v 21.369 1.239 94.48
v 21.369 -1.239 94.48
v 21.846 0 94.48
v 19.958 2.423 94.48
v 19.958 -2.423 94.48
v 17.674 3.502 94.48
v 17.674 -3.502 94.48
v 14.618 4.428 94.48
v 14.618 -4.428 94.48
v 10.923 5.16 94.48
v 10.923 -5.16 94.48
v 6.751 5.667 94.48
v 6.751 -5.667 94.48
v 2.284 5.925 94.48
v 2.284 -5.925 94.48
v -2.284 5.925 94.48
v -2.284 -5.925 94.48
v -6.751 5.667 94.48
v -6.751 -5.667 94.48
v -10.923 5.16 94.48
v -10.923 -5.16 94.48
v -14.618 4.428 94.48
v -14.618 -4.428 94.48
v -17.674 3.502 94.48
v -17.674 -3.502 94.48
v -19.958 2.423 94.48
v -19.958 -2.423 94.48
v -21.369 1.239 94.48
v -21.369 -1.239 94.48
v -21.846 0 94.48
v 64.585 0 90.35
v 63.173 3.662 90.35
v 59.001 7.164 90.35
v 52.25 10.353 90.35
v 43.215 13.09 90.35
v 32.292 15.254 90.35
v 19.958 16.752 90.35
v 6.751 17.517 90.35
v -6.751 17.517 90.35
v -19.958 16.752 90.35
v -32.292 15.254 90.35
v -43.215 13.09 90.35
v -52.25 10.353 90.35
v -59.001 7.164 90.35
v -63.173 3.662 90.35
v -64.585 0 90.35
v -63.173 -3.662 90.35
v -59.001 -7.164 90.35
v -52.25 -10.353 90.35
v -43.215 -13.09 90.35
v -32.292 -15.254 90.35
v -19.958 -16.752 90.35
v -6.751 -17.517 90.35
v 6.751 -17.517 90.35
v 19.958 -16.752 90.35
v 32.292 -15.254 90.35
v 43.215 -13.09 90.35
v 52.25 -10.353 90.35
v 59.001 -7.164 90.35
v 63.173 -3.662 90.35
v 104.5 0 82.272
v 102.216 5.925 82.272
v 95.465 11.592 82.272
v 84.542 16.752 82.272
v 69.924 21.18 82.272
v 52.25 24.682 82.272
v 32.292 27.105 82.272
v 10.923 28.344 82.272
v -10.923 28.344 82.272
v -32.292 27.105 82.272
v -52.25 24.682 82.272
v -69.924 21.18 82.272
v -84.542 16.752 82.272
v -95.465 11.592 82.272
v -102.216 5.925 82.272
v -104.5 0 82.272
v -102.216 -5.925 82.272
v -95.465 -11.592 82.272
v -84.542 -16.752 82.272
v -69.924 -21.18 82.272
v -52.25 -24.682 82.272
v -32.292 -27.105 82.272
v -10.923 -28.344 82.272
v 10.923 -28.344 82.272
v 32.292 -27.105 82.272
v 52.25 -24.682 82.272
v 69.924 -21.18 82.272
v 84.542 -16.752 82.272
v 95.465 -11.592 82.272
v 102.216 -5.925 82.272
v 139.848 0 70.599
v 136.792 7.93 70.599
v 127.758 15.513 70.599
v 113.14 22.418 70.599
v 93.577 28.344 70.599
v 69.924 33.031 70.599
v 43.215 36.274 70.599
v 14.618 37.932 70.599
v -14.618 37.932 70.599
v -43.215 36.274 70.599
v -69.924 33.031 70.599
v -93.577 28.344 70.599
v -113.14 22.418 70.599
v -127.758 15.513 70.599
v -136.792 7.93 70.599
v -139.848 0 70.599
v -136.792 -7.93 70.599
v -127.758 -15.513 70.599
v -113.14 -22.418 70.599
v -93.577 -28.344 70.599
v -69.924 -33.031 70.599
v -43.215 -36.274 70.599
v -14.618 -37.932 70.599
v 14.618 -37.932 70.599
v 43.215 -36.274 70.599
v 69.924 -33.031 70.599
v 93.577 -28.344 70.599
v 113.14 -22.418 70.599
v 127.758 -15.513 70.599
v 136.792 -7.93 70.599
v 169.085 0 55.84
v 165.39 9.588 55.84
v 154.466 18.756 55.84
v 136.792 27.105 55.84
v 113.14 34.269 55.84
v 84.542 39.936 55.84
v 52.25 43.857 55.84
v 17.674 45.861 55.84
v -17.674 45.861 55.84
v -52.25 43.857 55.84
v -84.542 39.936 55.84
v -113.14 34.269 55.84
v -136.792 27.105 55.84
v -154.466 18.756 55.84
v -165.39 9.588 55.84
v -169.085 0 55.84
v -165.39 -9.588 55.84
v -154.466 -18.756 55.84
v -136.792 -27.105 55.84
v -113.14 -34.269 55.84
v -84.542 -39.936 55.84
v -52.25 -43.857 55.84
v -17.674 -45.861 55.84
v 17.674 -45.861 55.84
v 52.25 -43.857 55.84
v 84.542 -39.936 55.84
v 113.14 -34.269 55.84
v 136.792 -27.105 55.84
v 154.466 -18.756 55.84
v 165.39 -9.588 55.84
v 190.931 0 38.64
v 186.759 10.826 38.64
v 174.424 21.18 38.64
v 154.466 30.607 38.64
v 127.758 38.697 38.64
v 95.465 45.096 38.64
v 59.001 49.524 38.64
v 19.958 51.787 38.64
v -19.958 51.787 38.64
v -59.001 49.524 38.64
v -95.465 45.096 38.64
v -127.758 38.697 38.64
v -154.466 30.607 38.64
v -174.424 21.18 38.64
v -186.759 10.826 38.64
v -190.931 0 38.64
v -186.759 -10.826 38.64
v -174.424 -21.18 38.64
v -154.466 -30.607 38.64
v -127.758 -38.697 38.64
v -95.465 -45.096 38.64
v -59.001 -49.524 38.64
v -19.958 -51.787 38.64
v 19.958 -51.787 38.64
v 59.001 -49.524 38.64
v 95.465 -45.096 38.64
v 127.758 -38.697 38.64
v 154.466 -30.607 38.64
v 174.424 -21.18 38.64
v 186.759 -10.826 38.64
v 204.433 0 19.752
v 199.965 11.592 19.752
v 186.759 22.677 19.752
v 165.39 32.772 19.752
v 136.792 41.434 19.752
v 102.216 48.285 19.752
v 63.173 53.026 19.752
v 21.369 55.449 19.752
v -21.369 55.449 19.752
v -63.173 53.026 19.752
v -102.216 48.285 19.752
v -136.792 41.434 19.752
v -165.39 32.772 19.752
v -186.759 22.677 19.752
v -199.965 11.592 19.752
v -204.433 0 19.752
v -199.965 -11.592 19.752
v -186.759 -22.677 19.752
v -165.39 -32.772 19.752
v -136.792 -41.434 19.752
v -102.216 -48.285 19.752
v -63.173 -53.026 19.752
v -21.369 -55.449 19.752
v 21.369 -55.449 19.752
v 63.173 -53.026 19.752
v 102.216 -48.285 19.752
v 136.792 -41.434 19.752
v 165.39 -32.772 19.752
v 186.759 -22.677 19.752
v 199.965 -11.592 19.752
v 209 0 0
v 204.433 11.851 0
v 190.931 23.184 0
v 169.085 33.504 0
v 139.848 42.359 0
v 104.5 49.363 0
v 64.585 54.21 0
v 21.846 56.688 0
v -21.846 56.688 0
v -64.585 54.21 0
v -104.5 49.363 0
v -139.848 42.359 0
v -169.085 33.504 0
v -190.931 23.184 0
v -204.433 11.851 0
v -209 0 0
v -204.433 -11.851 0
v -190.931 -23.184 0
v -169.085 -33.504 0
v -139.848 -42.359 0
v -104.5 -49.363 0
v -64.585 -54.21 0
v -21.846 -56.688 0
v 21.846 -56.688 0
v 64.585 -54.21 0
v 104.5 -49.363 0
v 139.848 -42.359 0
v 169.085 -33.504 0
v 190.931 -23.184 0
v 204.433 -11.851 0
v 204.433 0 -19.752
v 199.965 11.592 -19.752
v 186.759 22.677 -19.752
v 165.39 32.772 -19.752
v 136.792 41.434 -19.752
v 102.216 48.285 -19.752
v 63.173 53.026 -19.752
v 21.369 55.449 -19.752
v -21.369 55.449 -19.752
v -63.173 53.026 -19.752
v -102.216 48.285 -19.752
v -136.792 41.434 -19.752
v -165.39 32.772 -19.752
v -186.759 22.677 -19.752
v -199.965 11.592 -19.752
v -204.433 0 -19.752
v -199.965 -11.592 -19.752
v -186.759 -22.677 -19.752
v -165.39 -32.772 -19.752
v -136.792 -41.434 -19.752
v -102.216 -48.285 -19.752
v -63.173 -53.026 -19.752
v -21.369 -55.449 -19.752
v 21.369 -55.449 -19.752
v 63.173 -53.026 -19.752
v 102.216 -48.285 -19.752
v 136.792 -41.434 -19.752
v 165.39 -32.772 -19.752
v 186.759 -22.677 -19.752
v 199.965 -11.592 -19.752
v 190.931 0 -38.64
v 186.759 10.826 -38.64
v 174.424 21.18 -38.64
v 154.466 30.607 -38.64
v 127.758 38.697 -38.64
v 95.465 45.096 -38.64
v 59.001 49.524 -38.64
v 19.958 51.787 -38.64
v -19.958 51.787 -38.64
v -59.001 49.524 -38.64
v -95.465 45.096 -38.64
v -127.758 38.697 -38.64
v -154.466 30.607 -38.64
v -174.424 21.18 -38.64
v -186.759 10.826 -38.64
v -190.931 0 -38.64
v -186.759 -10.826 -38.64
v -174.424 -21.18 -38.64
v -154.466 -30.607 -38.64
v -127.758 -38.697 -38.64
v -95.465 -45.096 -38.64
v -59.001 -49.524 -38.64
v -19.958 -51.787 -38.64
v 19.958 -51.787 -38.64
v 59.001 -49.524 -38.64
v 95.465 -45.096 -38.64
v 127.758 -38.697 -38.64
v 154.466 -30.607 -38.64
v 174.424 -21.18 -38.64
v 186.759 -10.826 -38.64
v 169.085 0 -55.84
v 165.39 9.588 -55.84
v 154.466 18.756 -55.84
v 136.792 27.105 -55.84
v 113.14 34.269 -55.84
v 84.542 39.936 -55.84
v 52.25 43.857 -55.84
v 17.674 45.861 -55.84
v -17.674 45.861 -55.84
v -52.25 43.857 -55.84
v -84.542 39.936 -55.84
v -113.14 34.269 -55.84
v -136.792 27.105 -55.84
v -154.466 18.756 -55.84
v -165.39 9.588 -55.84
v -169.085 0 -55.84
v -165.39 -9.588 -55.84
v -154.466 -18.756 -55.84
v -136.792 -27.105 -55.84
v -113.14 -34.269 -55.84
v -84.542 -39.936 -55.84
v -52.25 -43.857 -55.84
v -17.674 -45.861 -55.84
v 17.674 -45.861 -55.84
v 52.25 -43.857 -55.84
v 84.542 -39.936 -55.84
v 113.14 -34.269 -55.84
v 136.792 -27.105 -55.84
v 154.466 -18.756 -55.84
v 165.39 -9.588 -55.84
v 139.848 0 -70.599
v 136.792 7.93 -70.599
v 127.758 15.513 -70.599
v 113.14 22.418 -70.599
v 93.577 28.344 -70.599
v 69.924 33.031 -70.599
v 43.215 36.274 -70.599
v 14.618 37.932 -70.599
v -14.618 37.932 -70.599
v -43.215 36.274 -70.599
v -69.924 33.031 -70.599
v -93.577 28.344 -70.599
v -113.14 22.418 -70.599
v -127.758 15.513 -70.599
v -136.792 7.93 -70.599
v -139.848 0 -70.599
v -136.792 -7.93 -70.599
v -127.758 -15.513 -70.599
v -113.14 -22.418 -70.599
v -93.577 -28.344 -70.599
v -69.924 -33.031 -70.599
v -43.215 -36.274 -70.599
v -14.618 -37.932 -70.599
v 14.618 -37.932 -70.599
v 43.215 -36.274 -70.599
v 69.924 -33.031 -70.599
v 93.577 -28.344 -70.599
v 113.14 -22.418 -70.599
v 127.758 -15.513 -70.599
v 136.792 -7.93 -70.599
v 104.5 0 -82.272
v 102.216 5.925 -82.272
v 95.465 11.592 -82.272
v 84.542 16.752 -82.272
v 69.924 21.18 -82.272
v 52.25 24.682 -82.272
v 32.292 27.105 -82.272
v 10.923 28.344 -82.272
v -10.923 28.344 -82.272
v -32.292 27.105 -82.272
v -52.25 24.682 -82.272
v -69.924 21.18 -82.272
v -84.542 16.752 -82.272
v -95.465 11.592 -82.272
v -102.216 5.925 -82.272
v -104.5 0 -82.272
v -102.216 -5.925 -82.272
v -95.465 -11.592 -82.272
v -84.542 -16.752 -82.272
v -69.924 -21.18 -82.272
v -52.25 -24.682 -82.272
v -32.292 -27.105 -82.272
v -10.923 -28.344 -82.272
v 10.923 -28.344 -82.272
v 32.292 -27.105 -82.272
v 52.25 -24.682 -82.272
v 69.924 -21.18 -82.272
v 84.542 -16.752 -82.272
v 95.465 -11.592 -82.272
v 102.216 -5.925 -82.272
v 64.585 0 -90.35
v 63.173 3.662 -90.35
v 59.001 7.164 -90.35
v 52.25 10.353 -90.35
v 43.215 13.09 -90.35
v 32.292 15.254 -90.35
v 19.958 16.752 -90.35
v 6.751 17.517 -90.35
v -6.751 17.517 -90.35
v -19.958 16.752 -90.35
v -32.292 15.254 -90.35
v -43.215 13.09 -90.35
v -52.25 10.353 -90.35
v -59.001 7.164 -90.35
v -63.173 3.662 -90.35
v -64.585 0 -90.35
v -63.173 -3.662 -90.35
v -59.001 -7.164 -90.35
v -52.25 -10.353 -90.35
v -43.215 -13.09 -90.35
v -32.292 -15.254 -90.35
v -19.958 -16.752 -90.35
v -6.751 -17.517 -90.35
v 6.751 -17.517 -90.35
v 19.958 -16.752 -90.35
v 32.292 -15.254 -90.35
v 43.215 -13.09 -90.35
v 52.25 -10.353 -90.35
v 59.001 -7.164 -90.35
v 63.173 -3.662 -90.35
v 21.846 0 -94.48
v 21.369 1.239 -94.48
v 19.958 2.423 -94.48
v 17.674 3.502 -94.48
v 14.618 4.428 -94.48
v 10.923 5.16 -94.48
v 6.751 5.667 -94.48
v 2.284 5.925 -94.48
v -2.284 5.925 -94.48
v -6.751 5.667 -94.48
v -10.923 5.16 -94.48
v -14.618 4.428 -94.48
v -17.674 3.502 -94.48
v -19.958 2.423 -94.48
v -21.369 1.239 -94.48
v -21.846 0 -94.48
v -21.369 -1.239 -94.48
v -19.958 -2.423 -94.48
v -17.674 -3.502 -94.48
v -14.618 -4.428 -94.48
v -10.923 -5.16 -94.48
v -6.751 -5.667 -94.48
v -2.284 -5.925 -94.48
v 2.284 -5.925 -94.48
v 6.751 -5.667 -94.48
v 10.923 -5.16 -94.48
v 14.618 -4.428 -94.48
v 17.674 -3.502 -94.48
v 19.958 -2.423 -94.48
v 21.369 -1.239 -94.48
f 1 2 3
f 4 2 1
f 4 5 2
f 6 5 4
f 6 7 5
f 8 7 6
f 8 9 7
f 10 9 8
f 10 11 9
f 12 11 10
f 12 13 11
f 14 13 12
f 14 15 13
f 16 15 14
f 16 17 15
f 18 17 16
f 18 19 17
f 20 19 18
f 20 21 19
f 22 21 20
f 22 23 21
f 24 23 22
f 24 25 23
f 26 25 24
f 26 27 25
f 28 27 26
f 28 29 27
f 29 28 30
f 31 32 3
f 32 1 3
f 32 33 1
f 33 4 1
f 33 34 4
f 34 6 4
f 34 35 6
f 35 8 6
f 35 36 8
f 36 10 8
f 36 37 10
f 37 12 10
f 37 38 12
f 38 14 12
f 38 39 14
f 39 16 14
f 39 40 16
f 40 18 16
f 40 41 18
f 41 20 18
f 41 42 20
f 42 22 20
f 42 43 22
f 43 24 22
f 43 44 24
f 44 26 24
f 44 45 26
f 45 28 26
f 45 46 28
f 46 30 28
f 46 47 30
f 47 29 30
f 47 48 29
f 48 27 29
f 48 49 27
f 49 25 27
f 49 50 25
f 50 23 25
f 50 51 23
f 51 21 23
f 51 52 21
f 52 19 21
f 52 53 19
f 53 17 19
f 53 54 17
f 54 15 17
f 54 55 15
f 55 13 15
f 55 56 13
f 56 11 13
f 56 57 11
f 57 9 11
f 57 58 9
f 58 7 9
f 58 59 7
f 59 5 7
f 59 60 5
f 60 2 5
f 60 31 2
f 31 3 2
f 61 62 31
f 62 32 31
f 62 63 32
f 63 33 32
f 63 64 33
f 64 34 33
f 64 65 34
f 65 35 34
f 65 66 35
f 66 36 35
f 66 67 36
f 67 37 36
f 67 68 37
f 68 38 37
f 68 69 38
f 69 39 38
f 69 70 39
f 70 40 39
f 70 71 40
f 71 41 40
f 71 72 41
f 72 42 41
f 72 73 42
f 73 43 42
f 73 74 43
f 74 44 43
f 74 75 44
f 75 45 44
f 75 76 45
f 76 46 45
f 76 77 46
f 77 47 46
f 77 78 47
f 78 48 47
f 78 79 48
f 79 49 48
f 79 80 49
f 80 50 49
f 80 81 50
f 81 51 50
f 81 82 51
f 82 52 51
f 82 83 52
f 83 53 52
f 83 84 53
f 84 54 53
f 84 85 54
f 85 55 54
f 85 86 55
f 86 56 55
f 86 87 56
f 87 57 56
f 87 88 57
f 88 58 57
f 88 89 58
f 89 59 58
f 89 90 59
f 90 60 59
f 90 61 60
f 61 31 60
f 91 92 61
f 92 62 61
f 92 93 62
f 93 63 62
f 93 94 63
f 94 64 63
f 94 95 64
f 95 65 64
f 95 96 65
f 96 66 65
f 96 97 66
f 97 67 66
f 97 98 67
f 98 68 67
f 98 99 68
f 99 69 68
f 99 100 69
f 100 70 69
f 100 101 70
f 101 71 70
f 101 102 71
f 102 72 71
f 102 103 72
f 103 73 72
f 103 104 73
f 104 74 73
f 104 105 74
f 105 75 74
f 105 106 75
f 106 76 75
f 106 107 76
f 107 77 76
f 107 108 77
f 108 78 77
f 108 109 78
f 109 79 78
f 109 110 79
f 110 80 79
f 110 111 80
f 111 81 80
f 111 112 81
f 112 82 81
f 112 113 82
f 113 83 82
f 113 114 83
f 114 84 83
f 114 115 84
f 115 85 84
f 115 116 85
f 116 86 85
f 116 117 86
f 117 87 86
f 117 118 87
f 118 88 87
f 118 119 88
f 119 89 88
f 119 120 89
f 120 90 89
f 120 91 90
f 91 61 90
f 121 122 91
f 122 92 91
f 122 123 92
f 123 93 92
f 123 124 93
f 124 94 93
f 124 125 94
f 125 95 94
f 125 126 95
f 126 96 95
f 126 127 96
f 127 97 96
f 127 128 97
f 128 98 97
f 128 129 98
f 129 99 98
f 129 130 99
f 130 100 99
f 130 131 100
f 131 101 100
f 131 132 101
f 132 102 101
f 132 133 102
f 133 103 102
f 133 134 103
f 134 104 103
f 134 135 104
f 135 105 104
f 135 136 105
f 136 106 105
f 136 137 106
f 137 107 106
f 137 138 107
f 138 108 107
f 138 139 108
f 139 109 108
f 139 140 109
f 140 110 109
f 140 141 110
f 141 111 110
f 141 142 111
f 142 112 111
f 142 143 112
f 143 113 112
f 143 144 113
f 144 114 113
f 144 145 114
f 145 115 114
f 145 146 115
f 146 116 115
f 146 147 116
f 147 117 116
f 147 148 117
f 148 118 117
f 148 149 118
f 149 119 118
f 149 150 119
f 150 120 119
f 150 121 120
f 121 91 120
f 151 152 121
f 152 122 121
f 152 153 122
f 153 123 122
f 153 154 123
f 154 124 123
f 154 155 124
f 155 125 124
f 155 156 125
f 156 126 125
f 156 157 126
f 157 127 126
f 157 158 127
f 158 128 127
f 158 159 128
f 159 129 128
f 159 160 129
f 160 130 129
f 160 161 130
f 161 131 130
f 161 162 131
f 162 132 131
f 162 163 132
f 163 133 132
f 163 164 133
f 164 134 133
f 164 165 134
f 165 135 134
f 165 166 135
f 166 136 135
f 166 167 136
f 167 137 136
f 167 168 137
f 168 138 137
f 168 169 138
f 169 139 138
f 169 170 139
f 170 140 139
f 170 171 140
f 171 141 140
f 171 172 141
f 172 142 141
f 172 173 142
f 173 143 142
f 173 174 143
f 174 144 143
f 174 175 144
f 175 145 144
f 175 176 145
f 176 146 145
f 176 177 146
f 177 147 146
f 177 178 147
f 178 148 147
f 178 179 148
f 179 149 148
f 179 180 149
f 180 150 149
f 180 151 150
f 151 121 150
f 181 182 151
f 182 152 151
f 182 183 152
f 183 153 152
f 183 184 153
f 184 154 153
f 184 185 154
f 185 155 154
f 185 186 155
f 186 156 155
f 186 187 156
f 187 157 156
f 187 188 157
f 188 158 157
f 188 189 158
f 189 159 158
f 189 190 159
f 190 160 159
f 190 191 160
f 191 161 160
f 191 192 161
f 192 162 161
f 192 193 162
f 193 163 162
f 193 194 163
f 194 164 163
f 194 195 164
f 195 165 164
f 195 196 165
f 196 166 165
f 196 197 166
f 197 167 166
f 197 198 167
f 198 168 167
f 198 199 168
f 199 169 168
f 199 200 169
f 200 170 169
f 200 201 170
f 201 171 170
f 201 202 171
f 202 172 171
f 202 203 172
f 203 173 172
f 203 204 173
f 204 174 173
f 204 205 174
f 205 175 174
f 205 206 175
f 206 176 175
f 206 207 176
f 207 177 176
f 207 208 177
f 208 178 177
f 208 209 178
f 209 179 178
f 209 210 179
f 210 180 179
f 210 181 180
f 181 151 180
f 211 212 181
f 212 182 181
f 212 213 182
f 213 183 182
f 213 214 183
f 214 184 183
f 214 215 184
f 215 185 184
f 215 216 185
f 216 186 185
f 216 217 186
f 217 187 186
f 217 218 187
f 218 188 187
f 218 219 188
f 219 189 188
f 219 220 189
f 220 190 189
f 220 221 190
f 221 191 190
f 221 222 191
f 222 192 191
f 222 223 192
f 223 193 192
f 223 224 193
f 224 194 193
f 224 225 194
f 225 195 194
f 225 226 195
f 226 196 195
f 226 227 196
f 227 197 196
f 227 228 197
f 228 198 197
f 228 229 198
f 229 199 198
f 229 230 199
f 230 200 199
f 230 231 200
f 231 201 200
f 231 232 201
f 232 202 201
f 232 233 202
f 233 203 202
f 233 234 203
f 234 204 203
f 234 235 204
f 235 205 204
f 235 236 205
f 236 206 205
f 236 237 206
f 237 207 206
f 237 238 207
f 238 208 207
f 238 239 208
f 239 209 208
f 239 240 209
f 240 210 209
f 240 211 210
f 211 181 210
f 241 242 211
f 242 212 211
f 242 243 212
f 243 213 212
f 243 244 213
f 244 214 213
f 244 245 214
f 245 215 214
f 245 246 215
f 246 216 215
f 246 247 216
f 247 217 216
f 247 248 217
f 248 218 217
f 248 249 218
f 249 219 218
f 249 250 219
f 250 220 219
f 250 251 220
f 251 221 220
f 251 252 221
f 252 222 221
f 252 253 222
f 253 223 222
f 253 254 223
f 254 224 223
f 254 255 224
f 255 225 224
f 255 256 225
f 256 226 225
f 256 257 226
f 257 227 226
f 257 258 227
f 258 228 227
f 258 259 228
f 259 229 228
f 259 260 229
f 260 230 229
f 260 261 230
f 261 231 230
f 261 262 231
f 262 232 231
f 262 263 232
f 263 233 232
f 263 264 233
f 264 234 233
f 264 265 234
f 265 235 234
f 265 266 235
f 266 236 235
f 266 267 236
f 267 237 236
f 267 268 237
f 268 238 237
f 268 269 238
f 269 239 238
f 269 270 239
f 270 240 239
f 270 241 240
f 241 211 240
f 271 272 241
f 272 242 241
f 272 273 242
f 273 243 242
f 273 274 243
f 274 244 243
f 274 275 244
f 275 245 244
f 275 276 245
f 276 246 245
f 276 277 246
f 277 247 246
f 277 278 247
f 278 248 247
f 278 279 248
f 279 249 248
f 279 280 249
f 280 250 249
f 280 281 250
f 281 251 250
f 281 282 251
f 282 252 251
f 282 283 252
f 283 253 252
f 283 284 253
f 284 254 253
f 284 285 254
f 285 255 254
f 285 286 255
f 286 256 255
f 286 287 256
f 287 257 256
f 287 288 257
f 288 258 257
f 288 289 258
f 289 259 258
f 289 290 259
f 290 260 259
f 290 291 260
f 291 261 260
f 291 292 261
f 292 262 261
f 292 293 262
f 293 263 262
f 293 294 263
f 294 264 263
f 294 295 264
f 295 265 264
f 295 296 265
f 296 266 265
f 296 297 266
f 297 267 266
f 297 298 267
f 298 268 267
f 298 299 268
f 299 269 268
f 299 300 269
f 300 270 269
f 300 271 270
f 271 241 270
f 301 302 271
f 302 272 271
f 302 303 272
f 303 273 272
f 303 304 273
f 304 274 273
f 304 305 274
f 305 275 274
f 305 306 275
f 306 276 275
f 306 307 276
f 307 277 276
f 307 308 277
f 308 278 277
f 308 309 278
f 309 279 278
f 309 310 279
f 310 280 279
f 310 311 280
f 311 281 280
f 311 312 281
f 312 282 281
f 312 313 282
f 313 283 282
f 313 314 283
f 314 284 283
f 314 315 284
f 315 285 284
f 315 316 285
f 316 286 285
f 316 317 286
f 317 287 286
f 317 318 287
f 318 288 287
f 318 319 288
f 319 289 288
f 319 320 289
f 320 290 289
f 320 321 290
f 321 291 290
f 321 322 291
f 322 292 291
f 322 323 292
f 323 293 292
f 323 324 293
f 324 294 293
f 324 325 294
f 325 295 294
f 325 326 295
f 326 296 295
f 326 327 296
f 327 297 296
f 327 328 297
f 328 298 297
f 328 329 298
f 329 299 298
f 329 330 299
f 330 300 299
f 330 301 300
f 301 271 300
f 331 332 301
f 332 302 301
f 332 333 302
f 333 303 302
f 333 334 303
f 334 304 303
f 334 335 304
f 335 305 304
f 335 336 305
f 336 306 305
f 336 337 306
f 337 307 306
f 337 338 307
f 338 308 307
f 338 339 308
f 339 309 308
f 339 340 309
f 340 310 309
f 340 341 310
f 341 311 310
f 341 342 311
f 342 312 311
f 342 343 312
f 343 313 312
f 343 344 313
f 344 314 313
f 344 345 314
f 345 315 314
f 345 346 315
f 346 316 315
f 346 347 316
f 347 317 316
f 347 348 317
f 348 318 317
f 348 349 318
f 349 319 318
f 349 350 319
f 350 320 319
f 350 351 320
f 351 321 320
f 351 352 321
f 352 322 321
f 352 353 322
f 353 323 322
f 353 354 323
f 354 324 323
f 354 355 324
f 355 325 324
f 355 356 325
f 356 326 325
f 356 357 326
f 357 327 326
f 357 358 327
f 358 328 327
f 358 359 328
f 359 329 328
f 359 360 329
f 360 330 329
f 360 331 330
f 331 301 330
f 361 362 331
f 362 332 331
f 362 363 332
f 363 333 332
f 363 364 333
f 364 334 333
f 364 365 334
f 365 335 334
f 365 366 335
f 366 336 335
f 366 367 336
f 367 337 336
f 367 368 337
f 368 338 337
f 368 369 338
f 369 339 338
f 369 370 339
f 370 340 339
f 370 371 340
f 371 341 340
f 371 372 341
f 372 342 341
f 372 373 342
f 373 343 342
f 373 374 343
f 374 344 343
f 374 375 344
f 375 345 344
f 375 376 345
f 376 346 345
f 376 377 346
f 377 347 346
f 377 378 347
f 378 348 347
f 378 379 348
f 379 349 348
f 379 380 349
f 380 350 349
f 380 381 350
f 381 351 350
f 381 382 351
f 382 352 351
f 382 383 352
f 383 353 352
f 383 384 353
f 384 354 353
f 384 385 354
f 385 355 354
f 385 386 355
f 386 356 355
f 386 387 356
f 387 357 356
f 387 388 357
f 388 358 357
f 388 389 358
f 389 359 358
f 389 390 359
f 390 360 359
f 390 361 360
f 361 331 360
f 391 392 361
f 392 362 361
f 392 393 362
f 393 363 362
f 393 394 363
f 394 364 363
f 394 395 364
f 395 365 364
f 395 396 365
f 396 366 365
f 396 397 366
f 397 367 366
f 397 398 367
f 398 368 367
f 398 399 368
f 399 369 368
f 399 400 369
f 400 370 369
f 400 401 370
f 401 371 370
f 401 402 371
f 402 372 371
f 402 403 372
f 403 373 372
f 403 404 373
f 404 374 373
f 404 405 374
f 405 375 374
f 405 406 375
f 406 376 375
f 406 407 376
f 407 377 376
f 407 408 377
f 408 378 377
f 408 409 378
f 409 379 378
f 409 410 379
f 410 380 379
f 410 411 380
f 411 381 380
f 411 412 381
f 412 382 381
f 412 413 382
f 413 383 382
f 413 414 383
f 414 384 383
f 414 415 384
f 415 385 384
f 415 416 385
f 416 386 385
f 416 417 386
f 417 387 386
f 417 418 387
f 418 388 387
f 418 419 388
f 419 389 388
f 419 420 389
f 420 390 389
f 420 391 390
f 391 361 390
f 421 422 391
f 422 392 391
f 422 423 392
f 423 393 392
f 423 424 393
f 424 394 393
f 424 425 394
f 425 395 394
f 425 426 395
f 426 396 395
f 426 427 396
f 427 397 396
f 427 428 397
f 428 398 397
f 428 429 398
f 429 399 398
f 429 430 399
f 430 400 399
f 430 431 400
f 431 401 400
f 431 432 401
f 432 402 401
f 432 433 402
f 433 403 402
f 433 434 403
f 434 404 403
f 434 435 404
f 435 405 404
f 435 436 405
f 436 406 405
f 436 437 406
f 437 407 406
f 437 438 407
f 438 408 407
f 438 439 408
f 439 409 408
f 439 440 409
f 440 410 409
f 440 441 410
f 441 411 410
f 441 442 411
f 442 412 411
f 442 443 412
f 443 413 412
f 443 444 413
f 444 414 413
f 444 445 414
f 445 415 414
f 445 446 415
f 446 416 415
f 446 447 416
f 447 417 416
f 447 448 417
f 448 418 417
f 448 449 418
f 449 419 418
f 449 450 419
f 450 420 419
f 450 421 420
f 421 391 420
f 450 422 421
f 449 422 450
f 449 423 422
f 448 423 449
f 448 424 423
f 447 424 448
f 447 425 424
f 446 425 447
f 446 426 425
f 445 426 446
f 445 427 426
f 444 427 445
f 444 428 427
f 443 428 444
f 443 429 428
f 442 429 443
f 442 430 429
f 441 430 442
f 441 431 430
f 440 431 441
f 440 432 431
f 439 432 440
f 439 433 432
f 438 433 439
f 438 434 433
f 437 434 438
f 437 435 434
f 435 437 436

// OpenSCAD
// Generated by SolidPython 1.0.1 on 2020-07-29 00:46:49


scale(v = [11, 3, 5]) {
	sphere(r = 19);
}
/***********************************************
*********      SolidPython code:      **********
************************************************
 
# import packages: SolidPython
from solid import *
from solid.utils import *
from itertools import chain, combinations, permutations


class Resize:

    def __init__(self, scad_file):
        self.scad_file = scad_file
        #self.scad_file = import_scad(scad_file)
        # cone/cylinder param:
        self.r1 = 0
        self.r2 = 0
        self.h = 0
        # rectangular prism param:
        self.w = 0
        self.l = 0
        # ellipse param:
        self.r = 0

    # import OpenScad code (file name corresponds to shape)


    # classify shape + parameters
    def assign(self, param1, param2, param3):
        if self.scad_file == 'cone.scad':
            self.r1 = param1
            self.r2 = param2
            self.h = param3
        elif self.scad_file == 'cylinder.scad':
            self.r1 = param1
            self.r2 = param2
            self.h = param3
        elif self.scad_file == 'rectangularPrism.scad':
            self.h = param1
            self.l = param2
            self.w = param3
        else:
            self.r = param1
            self.h = param2

    # resize parameters
    def iterate(self):
        x = range(3, 20, 2)
        i = 1
        if self.scad_file == 'cone.scad':
            tempList = list(permutations(x, 2))
            for temp in tempList:
                param1 = temp[0]
                param2 = temp[1]
                filepath = 'produced_scad_files/' + 'cone' + str(param1) + '_' + str(param2) + '_' + '.scad'
                scad_render_to_file(cylinder(h=param1, r1=param2, r2=0), filepath)

        elif self.scad_file == 'cylinder.scad':
            tempList = list(permutations(x, 3))
            for temp in tempList:
                param1 = temp[0]
                param2 = temp[1]
                filepath = 'produced_scad_files/' + 'cylinder' + str(param1) + '_' + str(param2) + '_' + '.scad'
                scad_render_to_file(cylinder(h=param1, r1=param2, r2=param2), filepath)

        elif self.scad_file == 'rectangularPrism.scad':
            tempList = list(permutations(x, 3))
            for temp in tempList:
                param1 = temp[0]
                param2 = temp[1]
                param3 = temp[2]
                filepath = 'produced_scad_files/' + 'rectangularPrism' + str(param1) + '_' + str(param2) + '_' + str(
                    param3) + '.scad'
                scad_render_to_file(cube(size=(param1, param2, param3)), filepath)

        elif self.scad_file == 'ellipse.scad':
            tempList = list(permutations(x, 4))
            for temp in tempList:
                param1 = temp[0]
                param2 = temp[1]
                param3 = temp[2]
                param4 = temp[3]
                filepath = 'produced_scad_files/' + 'ellipse' + str(param1) + '_' + str(param2) + '_' + str(param3) + '_' + str(param4) + '.scad'
                scad_render_to_file(scale([param1, param2, param3])(sphere(r=param4)), filepath)

    def render_to_scadfile(self):
        scad_render_to_file(scad, 'example.scad') 
 
************************************************/
